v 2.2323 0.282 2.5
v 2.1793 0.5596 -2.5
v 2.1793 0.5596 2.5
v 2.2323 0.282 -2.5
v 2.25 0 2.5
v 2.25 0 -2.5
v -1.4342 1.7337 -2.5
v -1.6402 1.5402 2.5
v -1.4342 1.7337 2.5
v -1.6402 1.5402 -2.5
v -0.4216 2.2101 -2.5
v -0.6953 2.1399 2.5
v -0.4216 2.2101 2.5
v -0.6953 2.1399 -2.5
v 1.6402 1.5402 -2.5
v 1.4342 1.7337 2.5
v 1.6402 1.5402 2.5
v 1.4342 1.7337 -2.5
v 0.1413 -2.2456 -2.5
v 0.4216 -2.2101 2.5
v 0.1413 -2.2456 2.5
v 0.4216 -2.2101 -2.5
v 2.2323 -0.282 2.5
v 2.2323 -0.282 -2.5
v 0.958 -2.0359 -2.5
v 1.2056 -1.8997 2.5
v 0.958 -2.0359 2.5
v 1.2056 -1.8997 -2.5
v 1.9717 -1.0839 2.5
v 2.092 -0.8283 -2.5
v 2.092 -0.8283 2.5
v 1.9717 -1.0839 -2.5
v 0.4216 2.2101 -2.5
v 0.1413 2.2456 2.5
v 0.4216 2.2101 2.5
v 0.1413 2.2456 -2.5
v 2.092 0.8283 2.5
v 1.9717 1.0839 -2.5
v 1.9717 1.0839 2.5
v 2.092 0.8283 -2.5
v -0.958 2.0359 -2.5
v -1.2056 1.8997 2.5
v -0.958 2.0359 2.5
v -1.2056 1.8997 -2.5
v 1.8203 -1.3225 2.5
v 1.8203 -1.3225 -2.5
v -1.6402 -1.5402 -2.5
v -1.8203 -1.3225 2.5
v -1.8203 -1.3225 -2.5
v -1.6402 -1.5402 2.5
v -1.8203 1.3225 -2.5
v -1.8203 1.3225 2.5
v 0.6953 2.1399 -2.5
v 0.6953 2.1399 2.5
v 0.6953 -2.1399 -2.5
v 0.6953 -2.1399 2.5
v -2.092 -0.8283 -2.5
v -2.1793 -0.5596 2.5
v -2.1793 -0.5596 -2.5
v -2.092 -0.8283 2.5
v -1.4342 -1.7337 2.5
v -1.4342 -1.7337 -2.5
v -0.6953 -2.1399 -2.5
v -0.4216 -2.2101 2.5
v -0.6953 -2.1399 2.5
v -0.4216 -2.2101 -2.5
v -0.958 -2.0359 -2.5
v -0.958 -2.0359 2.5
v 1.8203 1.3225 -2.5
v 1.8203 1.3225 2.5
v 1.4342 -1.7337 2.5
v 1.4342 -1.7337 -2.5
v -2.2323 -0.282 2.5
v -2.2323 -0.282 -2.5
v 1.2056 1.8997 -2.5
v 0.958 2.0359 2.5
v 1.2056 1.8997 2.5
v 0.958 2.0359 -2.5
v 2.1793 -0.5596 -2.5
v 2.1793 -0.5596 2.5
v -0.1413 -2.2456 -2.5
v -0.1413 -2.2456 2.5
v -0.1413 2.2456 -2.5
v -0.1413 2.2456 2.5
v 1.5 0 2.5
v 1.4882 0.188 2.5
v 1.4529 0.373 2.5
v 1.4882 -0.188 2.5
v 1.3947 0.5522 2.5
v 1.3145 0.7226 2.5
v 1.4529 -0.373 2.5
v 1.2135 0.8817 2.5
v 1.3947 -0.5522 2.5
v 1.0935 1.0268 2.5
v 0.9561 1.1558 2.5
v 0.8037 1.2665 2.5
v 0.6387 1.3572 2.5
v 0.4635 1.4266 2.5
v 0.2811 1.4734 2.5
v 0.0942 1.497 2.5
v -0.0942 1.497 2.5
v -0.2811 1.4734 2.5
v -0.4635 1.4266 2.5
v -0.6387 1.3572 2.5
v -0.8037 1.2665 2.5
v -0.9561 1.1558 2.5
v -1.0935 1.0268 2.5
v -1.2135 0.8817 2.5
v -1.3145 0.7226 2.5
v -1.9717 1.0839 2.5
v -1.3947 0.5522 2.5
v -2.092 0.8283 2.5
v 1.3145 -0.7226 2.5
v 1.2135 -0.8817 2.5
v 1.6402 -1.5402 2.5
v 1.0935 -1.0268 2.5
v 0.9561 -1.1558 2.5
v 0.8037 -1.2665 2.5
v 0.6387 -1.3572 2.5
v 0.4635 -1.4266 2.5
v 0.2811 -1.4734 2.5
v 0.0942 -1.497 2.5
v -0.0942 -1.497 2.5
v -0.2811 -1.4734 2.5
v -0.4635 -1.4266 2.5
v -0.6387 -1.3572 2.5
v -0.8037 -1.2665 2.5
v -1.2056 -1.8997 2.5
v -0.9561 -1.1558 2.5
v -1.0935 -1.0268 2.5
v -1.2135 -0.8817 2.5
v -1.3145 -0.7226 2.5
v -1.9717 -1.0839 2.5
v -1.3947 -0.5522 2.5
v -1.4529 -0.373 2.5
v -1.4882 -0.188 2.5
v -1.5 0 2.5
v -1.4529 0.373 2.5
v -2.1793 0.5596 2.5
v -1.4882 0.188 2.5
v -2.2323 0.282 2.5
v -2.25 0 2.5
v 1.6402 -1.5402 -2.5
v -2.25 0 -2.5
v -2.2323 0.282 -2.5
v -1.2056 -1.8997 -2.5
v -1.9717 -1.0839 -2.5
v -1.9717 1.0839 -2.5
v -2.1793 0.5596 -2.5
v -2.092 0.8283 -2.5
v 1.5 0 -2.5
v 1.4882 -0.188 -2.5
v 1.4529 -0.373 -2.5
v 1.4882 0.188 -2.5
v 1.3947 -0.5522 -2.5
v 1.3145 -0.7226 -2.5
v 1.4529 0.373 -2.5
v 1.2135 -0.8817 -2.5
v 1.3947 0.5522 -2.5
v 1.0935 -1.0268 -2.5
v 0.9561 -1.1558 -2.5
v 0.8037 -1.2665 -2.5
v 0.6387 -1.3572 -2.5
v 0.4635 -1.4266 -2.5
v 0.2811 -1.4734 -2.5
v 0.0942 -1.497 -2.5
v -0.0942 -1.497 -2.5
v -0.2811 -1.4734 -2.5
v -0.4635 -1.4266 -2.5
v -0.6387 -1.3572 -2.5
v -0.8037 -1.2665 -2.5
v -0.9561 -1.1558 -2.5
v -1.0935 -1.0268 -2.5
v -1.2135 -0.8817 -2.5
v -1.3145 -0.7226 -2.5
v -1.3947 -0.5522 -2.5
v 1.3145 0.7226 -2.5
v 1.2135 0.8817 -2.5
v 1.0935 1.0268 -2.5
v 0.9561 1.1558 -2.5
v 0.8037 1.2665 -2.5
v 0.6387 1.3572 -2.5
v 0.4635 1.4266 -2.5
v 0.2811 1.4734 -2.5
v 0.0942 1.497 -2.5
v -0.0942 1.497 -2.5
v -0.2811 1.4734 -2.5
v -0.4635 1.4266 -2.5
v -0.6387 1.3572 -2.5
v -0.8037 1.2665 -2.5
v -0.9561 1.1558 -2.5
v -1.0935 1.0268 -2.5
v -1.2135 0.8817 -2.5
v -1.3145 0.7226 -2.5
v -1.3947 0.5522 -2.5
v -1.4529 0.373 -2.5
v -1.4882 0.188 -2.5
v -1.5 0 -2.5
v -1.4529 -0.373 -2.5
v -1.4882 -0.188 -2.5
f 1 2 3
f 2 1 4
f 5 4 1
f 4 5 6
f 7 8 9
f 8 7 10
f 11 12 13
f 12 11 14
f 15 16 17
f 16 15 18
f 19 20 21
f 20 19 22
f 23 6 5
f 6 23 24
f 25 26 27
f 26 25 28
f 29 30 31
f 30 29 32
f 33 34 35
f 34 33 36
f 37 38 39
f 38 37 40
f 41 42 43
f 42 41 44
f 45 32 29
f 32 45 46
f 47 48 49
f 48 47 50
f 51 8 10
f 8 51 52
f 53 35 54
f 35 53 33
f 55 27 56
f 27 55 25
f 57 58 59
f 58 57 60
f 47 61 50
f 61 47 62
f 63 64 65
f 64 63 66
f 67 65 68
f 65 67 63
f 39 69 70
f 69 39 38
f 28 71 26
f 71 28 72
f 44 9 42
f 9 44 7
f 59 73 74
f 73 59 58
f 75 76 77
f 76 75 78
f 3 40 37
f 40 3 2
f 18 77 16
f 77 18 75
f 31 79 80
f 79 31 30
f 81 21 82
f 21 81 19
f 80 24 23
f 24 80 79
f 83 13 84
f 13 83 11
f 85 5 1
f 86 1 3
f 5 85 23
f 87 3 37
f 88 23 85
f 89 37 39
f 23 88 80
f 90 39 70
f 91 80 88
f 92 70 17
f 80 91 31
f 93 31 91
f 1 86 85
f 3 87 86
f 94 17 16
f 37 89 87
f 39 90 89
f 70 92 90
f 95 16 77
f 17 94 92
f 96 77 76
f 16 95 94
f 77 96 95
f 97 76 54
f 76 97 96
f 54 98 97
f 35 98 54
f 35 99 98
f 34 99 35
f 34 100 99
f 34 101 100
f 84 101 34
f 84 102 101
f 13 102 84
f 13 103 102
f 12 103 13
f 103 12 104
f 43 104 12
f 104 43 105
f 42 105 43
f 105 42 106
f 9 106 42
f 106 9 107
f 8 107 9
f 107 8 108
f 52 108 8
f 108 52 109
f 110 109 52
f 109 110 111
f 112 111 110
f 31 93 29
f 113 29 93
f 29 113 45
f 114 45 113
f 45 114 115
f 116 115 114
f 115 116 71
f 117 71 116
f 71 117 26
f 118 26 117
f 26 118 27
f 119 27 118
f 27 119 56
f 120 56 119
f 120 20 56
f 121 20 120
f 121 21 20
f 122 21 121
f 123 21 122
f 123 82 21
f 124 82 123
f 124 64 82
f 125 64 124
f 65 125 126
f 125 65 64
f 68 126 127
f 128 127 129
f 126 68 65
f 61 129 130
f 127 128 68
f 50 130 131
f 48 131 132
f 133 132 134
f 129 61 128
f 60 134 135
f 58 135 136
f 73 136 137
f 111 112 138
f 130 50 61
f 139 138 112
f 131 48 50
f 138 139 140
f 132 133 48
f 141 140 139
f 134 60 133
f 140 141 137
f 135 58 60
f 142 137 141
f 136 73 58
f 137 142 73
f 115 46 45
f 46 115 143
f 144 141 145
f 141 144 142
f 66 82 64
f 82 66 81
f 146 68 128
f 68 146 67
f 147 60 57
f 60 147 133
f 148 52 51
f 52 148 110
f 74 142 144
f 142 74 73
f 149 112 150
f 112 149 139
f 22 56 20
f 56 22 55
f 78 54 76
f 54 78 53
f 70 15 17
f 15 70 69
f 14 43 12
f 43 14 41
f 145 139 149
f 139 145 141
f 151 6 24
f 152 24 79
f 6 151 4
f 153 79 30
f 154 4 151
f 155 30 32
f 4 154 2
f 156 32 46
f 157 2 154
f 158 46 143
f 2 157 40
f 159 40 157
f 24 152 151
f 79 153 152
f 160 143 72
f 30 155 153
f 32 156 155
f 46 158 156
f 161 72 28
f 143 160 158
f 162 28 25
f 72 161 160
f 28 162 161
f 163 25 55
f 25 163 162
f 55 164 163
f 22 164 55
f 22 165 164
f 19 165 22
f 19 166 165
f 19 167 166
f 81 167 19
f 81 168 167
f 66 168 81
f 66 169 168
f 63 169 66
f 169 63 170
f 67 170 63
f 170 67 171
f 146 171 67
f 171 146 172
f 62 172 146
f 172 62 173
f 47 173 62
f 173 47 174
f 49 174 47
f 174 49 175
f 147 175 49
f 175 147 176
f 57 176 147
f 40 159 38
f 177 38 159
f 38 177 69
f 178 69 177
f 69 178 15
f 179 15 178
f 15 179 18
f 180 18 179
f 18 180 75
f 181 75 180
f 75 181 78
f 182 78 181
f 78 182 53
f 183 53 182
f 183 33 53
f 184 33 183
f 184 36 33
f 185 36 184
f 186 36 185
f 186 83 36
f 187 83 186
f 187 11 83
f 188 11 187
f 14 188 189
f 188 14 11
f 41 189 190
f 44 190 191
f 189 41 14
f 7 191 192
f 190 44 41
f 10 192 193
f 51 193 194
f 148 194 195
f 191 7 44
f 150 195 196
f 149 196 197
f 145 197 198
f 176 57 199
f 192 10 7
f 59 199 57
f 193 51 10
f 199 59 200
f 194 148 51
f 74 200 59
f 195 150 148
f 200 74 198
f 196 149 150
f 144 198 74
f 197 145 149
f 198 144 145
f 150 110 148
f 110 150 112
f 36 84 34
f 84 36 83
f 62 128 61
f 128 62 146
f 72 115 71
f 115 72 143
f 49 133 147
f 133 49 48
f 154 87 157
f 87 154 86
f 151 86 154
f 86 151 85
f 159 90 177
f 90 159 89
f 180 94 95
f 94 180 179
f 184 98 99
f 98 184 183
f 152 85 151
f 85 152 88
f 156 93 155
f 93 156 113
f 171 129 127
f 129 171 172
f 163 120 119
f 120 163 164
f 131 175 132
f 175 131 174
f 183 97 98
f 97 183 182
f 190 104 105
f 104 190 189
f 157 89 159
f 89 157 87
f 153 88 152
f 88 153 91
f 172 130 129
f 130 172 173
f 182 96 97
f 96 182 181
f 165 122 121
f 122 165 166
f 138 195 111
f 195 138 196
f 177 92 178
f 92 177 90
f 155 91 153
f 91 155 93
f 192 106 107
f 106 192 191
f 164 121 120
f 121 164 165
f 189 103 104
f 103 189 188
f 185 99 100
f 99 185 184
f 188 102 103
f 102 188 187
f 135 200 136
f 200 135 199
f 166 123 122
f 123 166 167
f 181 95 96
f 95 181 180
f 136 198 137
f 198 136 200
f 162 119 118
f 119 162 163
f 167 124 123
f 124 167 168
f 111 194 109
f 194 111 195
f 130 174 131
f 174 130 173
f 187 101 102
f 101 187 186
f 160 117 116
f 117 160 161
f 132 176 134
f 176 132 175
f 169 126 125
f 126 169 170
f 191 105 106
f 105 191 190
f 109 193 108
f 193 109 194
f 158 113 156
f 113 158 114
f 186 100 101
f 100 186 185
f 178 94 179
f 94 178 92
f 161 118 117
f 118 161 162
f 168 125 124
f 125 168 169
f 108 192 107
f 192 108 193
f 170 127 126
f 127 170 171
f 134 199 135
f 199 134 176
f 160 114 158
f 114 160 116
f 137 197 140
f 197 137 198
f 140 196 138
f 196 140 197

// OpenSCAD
$fn = 50;


difference() {
	union() {
		translate(v = [0, 0, -2.5000000000]) {
			cylinder(h = 5, r = 2.2500000000);
		}
	}
	union() {
		translate(v = [0, 0, -100.0000000000]) {
			cylinder(h = 200, r = 1.5000000000);
		}
	}
}
